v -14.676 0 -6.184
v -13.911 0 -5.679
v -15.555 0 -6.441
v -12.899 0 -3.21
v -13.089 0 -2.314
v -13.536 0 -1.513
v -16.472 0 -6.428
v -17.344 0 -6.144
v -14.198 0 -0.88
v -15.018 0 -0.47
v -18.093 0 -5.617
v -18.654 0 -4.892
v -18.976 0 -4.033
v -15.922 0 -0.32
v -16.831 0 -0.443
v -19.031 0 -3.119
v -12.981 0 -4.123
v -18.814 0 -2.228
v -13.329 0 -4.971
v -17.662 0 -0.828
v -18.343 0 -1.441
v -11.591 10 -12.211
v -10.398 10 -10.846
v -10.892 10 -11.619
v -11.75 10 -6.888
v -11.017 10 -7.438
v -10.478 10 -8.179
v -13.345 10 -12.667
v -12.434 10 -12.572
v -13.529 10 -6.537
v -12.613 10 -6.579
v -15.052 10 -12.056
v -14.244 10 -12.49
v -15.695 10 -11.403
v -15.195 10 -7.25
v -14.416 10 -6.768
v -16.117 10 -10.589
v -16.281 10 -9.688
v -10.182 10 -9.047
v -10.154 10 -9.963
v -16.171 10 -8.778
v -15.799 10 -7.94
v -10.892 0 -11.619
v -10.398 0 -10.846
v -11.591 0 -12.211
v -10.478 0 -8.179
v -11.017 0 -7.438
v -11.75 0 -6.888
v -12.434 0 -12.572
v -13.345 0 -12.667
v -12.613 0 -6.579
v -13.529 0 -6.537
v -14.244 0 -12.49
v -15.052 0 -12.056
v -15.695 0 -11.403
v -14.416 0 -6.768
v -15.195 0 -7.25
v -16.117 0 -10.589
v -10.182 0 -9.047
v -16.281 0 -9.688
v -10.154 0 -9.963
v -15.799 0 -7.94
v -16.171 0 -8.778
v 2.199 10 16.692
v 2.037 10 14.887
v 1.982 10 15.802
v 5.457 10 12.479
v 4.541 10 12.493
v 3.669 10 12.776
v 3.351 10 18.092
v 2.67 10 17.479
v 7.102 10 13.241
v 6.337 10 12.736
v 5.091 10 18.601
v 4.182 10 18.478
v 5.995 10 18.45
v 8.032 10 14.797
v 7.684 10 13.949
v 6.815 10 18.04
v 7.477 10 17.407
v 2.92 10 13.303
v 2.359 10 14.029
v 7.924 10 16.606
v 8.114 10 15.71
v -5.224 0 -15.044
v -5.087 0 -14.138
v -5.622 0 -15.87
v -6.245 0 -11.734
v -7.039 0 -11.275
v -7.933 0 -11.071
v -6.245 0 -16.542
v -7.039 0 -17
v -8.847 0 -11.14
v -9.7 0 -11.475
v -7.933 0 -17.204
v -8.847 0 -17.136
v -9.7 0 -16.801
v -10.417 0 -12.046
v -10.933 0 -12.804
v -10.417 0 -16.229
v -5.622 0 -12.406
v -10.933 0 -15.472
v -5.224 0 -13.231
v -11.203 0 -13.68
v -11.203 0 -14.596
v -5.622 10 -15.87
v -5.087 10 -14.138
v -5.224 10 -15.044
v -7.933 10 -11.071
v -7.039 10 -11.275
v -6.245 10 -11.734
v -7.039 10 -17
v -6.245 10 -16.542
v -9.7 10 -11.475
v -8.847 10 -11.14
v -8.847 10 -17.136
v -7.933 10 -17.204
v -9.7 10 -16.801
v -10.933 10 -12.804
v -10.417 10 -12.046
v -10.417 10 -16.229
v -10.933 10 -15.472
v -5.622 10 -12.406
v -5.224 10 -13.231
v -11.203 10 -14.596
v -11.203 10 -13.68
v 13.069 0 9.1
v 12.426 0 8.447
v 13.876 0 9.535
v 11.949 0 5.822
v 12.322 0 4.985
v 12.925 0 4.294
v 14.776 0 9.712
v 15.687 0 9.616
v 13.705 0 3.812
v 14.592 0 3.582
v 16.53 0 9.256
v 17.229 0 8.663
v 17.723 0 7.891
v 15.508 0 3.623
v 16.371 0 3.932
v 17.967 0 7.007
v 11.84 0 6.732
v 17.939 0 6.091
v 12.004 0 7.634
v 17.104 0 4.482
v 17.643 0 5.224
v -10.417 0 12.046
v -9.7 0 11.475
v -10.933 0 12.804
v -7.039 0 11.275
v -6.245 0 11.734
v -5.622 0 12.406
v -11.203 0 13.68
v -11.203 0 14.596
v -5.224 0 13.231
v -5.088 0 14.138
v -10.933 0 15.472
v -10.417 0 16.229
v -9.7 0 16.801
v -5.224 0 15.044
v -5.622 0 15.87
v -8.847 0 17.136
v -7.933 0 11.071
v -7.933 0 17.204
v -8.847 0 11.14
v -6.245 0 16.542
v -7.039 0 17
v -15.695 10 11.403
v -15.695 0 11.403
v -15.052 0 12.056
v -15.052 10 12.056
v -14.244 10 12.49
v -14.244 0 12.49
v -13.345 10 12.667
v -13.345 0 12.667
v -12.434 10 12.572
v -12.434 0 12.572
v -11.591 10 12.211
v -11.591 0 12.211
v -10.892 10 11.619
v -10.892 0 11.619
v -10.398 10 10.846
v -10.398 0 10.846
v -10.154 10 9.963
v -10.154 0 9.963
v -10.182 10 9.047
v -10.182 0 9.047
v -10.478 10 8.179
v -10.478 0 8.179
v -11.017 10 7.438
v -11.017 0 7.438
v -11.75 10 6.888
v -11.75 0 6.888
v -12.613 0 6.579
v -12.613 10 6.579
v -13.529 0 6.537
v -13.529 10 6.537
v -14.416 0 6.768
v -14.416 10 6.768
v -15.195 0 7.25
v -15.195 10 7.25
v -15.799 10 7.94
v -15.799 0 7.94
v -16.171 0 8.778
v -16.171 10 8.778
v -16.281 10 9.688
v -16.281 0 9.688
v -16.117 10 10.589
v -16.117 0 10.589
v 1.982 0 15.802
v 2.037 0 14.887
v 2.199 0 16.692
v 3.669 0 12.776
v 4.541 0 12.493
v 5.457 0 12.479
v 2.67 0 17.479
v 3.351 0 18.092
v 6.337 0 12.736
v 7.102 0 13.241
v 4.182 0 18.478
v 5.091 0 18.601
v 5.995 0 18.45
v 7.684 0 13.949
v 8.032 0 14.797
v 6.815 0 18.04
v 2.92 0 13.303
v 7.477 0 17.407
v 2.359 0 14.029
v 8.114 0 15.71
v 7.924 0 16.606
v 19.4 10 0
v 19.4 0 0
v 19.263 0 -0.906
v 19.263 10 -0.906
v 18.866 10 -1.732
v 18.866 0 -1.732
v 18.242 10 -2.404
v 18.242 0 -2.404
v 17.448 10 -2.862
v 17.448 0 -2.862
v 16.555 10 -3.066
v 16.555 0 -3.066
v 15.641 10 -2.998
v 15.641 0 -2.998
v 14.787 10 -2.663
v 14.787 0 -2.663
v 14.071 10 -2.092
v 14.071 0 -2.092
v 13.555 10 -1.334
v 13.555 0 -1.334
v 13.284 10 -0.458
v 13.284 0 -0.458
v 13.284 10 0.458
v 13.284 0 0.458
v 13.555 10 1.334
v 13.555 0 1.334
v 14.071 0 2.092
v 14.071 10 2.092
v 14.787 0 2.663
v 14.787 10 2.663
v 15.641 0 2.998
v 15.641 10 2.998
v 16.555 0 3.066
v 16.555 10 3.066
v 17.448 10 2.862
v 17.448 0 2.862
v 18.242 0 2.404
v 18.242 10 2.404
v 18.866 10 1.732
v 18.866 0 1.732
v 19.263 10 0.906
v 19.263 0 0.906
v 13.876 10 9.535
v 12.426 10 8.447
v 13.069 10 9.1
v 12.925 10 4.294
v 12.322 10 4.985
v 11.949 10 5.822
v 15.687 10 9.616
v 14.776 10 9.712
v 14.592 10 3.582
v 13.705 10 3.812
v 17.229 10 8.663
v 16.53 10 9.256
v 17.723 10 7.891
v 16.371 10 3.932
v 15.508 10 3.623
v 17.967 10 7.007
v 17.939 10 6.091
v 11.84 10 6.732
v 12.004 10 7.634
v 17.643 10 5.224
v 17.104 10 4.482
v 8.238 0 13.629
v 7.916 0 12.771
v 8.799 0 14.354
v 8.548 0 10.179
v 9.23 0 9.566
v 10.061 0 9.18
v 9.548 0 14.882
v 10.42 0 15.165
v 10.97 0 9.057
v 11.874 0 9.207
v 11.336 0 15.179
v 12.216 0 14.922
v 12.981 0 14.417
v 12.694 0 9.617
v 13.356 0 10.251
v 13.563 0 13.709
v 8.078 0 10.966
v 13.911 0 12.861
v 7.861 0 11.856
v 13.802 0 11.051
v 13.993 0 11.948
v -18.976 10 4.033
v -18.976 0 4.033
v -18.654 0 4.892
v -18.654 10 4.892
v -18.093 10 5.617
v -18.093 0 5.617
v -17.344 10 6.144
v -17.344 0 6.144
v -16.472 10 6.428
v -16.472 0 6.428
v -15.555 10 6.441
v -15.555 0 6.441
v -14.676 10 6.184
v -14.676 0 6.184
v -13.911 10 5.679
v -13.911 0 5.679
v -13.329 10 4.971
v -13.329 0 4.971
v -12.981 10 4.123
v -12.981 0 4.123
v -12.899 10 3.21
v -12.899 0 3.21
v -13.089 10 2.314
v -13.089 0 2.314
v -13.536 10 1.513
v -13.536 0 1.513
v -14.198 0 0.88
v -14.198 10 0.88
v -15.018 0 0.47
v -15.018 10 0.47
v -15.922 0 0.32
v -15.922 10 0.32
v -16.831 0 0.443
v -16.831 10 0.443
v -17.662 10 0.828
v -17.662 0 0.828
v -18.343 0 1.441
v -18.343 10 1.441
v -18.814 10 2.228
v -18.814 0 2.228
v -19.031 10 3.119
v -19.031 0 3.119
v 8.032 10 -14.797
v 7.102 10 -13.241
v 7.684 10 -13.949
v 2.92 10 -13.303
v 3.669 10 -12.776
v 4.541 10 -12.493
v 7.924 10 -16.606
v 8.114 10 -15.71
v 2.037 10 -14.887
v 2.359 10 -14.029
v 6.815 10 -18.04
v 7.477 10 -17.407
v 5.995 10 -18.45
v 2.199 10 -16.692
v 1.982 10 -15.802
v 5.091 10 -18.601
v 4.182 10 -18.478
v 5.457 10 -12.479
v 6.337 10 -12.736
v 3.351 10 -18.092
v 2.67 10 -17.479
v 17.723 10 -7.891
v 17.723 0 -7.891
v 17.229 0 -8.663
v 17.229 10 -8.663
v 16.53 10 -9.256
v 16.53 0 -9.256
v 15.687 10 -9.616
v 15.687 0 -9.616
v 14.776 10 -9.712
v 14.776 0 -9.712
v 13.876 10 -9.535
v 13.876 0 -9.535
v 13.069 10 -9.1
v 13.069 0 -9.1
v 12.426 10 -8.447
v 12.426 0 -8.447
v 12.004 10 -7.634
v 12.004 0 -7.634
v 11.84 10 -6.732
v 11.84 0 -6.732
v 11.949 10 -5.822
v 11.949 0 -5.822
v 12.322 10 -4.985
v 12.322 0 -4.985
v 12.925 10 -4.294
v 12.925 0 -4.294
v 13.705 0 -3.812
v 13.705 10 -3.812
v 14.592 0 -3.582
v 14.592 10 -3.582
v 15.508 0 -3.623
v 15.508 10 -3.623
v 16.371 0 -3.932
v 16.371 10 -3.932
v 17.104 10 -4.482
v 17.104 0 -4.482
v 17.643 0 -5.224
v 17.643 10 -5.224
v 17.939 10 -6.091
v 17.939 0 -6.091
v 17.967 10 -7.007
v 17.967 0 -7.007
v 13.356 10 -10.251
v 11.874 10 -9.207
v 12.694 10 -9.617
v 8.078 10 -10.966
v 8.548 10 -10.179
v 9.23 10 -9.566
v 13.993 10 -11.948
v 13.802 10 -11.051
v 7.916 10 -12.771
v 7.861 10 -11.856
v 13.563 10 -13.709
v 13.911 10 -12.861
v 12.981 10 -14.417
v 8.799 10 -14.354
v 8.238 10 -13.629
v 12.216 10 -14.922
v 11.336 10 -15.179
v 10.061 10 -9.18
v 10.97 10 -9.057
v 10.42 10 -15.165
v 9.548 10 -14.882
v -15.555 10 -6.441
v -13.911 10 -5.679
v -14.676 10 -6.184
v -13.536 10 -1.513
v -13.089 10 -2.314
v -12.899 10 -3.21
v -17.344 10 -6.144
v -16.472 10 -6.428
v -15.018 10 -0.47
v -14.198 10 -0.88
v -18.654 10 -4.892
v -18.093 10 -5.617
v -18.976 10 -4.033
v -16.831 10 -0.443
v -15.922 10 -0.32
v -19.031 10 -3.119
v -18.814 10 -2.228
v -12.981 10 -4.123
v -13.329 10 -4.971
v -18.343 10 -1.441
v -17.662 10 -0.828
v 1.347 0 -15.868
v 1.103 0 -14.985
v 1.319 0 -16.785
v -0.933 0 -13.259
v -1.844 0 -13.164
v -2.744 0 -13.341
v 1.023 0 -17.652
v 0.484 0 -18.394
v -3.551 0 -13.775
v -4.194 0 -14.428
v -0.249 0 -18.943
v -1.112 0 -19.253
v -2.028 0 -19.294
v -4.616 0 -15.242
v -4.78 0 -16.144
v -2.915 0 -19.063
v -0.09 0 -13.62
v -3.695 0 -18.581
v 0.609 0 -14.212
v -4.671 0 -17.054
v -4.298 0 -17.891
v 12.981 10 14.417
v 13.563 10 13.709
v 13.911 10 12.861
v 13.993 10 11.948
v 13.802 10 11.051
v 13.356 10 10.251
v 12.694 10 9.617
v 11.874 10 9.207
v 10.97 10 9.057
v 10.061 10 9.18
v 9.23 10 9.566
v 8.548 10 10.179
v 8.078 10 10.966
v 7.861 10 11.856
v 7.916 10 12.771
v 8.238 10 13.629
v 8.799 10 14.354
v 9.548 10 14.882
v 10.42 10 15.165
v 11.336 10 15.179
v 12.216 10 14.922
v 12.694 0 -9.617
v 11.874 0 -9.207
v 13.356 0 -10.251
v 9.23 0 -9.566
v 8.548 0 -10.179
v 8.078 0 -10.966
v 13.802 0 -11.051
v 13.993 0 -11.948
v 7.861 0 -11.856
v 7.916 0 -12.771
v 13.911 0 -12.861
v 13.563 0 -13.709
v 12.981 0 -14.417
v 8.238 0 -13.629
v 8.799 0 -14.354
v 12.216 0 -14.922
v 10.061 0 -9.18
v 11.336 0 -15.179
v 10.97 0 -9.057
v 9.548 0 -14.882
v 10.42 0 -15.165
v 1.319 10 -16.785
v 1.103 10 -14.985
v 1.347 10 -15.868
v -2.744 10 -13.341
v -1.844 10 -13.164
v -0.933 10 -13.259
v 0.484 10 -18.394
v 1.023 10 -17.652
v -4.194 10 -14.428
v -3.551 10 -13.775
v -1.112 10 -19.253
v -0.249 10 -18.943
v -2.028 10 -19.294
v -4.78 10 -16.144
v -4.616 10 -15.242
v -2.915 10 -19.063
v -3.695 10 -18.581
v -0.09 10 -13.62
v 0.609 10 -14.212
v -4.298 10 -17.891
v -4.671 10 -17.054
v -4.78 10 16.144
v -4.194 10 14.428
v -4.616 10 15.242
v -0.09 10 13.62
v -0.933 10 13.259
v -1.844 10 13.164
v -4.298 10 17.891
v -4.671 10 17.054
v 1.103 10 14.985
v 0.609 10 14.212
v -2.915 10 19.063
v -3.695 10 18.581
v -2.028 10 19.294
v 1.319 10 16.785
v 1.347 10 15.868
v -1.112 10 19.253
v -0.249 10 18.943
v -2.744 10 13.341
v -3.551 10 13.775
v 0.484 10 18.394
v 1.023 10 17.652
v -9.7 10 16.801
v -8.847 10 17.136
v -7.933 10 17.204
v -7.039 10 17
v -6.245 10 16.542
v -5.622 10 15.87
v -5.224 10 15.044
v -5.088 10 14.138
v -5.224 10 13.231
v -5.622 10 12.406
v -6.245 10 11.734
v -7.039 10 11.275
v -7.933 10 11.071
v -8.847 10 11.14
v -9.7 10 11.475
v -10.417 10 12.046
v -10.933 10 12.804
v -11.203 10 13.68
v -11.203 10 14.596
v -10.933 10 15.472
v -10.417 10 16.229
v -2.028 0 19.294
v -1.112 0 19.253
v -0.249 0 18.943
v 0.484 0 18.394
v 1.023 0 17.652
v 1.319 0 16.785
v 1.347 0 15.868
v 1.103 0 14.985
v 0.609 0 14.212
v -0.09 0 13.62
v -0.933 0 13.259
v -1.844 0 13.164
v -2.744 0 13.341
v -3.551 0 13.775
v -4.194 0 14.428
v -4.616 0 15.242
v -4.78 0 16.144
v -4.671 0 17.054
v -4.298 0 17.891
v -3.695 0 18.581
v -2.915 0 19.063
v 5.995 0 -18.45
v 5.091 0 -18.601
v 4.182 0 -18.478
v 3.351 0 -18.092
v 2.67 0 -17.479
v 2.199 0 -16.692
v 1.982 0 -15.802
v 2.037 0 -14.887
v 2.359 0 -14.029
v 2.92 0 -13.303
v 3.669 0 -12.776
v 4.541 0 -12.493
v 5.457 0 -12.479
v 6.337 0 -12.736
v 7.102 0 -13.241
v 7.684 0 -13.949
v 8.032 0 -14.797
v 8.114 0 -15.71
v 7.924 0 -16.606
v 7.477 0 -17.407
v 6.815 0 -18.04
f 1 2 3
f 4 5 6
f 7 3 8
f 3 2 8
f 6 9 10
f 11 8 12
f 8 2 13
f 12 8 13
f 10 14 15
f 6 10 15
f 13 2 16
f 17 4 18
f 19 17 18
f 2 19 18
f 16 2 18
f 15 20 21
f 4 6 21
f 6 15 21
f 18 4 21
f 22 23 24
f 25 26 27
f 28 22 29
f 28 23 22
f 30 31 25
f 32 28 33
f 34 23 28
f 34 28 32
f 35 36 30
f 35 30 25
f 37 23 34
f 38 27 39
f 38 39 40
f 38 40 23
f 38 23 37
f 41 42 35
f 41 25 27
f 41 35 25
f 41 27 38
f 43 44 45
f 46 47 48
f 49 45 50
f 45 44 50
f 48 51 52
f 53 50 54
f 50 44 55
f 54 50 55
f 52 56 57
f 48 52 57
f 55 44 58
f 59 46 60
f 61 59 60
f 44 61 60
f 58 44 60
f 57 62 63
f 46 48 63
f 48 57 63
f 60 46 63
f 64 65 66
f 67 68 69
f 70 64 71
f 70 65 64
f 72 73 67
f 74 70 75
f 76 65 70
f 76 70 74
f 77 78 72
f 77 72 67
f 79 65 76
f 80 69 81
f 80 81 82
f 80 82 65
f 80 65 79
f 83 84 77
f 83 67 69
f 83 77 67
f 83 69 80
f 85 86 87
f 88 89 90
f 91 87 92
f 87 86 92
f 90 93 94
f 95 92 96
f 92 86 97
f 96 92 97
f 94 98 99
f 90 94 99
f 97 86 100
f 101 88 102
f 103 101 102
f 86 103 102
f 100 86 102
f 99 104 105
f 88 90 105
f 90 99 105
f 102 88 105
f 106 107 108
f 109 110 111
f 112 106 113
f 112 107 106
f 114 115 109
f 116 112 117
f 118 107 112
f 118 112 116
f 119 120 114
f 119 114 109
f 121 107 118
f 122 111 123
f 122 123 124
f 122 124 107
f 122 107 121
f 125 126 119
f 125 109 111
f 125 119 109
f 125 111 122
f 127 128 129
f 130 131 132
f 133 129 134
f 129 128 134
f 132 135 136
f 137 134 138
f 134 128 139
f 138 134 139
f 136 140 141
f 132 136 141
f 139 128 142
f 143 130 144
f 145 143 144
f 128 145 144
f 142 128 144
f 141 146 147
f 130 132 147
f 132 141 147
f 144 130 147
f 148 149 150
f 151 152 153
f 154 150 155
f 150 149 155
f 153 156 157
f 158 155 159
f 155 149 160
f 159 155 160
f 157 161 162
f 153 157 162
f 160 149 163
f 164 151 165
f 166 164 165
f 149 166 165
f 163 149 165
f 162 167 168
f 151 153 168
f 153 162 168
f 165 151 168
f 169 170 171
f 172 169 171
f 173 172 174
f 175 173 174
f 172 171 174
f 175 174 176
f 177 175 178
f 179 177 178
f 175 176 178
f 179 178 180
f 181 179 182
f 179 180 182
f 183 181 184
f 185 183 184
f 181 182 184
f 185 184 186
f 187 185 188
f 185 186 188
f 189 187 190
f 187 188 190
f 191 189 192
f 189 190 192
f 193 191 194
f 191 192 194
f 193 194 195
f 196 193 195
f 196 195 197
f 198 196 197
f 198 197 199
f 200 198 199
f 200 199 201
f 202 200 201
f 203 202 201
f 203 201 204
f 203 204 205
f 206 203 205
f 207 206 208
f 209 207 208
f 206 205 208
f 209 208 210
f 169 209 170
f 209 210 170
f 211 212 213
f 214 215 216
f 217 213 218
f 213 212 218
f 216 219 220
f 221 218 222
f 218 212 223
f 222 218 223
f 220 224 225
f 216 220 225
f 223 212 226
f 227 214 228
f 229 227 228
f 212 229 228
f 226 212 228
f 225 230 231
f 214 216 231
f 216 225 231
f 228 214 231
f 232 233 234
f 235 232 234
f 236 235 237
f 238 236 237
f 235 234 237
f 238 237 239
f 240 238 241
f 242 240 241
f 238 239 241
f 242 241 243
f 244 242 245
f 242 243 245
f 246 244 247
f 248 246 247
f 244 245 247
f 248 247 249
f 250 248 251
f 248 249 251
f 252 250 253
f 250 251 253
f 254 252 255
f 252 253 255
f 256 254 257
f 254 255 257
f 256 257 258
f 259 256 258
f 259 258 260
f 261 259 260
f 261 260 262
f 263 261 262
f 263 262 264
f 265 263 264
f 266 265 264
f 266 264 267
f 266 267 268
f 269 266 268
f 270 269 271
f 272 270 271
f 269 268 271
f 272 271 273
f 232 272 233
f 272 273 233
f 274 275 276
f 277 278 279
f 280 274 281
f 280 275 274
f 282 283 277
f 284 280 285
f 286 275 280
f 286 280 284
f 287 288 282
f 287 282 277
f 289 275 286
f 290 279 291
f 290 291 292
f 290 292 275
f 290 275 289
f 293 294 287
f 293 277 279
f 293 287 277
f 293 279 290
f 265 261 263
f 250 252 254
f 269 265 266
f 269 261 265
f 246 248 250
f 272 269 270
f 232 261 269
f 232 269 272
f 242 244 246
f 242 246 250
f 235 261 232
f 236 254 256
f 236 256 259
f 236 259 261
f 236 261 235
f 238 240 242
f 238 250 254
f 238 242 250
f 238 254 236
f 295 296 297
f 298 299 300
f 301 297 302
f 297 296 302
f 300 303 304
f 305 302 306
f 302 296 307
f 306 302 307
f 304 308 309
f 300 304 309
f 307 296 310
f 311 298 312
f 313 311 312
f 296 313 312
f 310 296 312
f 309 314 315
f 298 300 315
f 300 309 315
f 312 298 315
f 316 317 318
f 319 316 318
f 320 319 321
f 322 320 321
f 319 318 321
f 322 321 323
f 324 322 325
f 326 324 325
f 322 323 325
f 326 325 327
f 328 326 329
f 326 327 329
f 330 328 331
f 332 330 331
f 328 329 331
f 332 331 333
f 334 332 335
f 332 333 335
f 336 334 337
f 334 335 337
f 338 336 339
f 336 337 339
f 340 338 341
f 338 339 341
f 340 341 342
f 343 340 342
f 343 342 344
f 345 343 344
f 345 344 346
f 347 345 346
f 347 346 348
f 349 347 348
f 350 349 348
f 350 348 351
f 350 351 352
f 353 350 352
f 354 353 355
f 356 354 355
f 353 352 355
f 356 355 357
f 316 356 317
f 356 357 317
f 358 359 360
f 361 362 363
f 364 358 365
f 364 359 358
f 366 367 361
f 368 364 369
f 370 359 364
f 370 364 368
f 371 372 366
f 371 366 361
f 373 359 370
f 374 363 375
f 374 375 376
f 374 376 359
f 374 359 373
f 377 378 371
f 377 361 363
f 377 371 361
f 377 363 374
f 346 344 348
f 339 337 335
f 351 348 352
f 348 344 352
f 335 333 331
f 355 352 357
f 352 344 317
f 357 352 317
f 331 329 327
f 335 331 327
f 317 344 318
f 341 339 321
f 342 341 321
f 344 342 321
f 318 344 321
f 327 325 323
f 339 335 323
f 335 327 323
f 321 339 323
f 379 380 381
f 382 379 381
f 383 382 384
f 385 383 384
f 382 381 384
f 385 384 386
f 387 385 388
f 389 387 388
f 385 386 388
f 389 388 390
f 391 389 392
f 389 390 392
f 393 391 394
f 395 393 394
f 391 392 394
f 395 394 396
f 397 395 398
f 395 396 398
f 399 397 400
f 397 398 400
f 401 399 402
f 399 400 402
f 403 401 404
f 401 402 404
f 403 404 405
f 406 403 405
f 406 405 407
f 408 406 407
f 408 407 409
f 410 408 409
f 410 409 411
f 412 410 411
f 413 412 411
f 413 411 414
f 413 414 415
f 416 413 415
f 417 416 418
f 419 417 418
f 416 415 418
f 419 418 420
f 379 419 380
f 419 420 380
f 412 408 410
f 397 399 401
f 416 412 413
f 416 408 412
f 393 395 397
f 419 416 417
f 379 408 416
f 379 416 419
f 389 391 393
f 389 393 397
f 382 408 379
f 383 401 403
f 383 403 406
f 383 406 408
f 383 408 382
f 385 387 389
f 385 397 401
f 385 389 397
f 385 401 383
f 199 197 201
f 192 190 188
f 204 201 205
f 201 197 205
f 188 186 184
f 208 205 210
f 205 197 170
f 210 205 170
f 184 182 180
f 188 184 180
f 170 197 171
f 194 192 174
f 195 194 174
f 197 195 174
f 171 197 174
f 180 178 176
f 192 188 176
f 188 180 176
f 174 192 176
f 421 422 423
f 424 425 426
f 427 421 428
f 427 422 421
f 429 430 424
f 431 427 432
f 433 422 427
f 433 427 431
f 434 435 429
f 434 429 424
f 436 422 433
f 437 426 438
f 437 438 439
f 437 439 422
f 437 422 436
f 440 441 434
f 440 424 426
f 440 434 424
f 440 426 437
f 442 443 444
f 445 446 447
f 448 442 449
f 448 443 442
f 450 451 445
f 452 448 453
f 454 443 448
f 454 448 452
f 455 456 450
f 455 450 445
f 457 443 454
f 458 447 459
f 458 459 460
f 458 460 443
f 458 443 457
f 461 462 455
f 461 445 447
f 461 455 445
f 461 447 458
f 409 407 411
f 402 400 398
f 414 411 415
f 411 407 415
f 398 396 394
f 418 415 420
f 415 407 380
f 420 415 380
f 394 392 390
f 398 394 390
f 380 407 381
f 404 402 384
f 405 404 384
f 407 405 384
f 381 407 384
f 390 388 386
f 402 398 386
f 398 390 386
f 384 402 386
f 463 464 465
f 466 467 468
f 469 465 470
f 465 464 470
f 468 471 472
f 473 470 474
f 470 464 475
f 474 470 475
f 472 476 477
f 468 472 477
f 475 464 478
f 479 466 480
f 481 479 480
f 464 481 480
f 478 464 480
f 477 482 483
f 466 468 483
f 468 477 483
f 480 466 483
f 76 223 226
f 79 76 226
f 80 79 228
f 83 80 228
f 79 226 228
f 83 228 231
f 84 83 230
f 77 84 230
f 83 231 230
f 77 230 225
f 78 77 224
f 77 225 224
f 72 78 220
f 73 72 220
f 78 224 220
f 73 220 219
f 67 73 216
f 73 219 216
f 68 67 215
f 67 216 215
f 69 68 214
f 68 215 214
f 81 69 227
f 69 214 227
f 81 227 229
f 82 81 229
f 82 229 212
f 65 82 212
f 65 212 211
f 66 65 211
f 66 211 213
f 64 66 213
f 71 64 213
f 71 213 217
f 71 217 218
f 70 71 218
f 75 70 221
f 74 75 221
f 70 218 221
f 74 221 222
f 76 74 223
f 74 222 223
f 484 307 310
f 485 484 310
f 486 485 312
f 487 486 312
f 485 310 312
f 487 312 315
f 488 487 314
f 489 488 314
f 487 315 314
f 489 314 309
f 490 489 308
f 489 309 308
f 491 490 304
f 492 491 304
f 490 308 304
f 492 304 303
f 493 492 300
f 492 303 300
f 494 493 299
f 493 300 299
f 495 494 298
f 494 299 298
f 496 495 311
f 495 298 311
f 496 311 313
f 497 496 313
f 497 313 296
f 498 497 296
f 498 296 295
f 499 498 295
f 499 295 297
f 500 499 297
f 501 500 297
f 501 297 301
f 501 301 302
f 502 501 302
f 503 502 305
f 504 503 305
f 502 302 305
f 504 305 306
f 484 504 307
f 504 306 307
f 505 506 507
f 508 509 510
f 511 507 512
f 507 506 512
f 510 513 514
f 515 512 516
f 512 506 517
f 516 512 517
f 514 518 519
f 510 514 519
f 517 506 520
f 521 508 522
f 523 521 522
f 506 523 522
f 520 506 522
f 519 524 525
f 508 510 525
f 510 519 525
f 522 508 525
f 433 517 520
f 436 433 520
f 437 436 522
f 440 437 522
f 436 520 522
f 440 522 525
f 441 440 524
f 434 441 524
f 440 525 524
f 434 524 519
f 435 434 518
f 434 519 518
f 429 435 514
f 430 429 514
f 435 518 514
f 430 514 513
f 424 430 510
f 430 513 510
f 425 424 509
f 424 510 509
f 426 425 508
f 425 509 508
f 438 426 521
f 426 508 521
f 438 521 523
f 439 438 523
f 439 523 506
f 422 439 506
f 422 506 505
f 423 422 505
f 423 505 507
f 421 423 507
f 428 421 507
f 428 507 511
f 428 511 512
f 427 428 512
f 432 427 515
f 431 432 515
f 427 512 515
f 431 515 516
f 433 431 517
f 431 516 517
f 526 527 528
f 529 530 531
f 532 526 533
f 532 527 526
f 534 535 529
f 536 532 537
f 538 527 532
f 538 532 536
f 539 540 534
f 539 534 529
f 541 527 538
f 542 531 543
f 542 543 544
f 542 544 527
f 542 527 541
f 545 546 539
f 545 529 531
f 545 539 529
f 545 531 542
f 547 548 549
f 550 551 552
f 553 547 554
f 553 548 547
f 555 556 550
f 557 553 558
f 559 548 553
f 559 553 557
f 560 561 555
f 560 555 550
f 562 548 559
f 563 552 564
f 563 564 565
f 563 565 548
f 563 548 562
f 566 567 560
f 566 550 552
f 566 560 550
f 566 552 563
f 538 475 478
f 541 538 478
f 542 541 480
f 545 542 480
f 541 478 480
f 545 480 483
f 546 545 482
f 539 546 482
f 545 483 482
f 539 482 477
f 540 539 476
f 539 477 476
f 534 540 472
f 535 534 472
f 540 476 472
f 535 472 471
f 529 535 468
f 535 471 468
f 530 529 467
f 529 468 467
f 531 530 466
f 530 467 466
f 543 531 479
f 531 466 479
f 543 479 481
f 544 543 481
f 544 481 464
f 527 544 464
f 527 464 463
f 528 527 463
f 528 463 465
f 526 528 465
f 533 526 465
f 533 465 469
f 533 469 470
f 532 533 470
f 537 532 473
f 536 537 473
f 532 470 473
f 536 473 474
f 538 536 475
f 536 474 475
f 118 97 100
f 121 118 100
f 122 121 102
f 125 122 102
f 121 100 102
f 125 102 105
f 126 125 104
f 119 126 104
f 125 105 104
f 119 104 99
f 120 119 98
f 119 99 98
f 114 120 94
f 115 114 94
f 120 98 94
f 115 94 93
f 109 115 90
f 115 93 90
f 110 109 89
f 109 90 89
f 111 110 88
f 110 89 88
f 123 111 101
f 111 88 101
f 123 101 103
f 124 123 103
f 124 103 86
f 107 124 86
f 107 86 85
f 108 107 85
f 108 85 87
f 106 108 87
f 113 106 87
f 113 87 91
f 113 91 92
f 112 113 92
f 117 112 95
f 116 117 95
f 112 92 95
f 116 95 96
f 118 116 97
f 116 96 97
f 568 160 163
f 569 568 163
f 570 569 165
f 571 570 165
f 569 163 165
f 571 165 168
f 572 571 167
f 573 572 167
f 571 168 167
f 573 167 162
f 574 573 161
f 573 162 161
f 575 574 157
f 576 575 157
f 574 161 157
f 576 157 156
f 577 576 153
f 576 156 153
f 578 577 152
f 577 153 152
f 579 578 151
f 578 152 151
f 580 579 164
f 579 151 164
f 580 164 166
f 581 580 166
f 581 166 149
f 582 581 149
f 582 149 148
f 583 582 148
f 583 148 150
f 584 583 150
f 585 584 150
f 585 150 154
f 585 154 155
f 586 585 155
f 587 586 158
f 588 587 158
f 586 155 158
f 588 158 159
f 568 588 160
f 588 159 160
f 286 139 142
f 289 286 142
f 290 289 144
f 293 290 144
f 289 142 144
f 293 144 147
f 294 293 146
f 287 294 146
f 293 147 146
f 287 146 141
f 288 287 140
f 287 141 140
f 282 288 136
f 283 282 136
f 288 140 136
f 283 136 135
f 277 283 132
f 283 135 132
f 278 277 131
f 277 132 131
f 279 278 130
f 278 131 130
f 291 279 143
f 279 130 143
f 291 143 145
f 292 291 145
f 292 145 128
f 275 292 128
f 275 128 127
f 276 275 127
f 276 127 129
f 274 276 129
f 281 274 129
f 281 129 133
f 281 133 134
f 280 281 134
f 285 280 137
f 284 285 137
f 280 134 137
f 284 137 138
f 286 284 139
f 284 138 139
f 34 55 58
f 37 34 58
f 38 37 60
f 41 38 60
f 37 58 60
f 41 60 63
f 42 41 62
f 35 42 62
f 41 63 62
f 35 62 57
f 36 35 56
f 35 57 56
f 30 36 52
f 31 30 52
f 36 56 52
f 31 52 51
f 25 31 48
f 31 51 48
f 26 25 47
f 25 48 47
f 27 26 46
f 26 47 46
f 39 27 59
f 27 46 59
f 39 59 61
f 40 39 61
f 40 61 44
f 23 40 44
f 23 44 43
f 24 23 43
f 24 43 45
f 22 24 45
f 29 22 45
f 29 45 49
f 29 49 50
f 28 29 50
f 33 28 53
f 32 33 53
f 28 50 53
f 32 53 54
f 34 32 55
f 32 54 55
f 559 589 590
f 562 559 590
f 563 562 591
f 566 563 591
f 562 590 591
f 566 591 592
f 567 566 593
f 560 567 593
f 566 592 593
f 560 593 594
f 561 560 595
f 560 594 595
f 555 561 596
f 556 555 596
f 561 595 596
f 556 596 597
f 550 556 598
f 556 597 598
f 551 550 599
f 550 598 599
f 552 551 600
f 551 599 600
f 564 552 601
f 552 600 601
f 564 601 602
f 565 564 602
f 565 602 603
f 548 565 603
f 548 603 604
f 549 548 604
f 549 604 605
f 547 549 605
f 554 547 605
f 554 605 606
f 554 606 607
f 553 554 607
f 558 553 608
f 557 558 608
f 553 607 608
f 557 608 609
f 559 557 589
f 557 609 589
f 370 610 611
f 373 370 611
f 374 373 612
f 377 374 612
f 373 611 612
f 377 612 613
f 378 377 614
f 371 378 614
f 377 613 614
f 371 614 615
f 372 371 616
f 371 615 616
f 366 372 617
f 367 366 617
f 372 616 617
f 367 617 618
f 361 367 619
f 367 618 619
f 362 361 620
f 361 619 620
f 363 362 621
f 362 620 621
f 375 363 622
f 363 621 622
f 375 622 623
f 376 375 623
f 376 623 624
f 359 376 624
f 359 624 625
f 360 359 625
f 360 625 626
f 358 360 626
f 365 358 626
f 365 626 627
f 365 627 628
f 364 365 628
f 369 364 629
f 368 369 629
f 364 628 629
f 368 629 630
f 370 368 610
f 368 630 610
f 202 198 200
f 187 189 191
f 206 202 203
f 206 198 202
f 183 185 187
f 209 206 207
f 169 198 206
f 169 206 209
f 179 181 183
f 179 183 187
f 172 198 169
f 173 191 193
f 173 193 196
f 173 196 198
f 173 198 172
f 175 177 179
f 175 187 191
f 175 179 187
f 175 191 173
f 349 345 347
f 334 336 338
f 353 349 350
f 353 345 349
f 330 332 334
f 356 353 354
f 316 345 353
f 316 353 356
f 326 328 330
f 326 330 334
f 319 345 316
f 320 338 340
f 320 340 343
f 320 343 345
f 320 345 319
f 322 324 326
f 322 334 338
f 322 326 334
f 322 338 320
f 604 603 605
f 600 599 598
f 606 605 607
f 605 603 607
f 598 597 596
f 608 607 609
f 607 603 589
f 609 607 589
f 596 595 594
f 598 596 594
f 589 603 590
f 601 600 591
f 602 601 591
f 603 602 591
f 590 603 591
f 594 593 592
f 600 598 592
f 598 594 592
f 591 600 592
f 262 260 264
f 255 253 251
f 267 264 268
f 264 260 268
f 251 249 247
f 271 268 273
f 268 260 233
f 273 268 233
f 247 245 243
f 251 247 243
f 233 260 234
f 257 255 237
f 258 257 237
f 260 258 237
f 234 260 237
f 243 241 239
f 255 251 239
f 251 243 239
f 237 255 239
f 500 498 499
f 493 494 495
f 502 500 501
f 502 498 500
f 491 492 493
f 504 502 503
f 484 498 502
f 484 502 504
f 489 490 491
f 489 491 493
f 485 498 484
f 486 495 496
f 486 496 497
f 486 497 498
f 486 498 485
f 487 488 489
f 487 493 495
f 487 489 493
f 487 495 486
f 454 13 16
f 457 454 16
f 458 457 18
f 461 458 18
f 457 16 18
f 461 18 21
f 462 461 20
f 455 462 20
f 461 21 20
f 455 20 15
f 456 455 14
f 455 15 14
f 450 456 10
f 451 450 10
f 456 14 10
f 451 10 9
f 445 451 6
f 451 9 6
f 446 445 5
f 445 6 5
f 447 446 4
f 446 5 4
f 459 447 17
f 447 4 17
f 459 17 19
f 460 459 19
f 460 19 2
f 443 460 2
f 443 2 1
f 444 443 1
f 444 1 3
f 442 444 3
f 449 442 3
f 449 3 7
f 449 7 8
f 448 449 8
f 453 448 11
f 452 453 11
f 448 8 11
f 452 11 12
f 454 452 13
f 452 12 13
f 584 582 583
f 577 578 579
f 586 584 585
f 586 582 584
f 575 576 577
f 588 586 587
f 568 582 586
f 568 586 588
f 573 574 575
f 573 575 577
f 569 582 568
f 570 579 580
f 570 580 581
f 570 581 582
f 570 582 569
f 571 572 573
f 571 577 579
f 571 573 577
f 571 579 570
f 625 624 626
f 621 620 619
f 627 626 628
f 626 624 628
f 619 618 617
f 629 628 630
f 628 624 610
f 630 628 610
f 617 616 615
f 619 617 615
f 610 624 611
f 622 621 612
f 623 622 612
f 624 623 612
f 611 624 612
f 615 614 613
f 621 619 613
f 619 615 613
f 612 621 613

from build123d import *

# Parameters (mm, degrees)
SKETCH1_R           = 3.075
BOSS_EXTRUDE1_DEPTH = 10
CIRPATTERN1_COUNT   = 15


with BuildPart() as part:
    # Sketch1 → Boss-Extrude1 (new body)
    with BuildSketch(Plane(origin=(0, 0, 0), x_dir=(1, 0, 0), z_dir=(0, 1, 0))):
        with Locations((16.325, 0)):
            Circle(SKETCH1_R)
    extrude(amount=BOSS_EXTRUDE1_DEPTH)


with BuildPart() as cirpattern1_1:
    # CirPattern1: pattern copy
    add(part.part.rotate(Axis((0, 0, 0), (0, 1, 0)), 1 * 360 / CIRPATTERN1_COUNT))


with BuildPart() as cirpattern1_2:
    # CirPattern1: pattern copy
    add(part.part.rotate(Axis((0, 0, 0), (0, 1, 0)), 2 * 360 / CIRPATTERN1_COUNT))


with BuildPart() as cirpattern1_3:
    # CirPattern1: pattern copy
    add(part.part.rotate(Axis((0, 0, 0), (0, 1, 0)), 3 * 360 / CIRPATTERN1_COUNT))


with BuildPart() as cirpattern1_4:
    # CirPattern1: pattern copy
    add(part.part.rotate(Axis((0, 0, 0), (0, 1, 0)), 4 * 360 / CIRPATTERN1_COUNT))


with BuildPart() as cirpattern1_5:
    # CirPattern1: pattern copy
    add(part.part.rotate(Axis((0, 0, 0), (0, 1, 0)), 5 * 360 / CIRPATTERN1_COUNT))


with BuildPart() as cirpattern1_6:
    # CirPattern1: pattern copy
    add(part.part.rotate(Axis((0, 0, 0), (0, 1, 0)), 6 * 360 / CIRPATTERN1_COUNT))


with BuildPart() as cirpattern1_7:
    # CirPattern1: pattern copy
    add(part.part.rotate(Axis((0, 0, 0), (0, 1, 0)), 7 * 360 / CIRPATTERN1_COUNT))


with BuildPart() as cirpattern1_8:
    # CirPattern1: pattern copy
    add(part.part.rotate(Axis((0, 0, 0), (0, 1, 0)), 8 * 360 / CIRPATTERN1_COUNT))


with BuildPart() as cirpattern1_9:
    # CirPattern1: pattern copy
    add(part.part.rotate(Axis((0, 0, 0), (0, 1, 0)), 9 * 360 / CIRPATTERN1_COUNT))


with BuildPart() as cirpattern1_10:
    # CirPattern1: pattern copy
    add(part.part.rotate(Axis((0, 0, 0), (0, 1, 0)), 10 * 360 / CIRPATTERN1_COUNT))


with BuildPart() as cirpattern1_11:
    # CirPattern1: pattern copy
    add(part.part.rotate(Axis((0, 0, 0), (0, 1, 0)), 11 * 360 / CIRPATTERN1_COUNT))


with BuildPart() as cirpattern1_12:
    # CirPattern1: pattern copy
    add(part.part.rotate(Axis((0, 0, 0), (0, 1, 0)), 12 * 360 / CIRPATTERN1_COUNT))


with BuildPart() as cirpattern1_13:
    # CirPattern1: pattern copy
    add(part.part.rotate(Axis((0, 0, 0), (0, 1, 0)), 13 * 360 / CIRPATTERN1_COUNT))


with BuildPart() as cirpattern1_14:
    # CirPattern1: pattern copy
    add(part.part.rotate(Axis((0, 0, 0), (0, 1, 0)), 14 * 360 / CIRPATTERN1_COUNT))


solid = Compound([part.part, cirpattern1_1.part, cirpattern1_2.part, cirpattern1_3.part, cirpattern1_4.part, cirpattern1_5.part, cirpattern1_6.part, cirpattern1_7.part, cirpattern1_8.part, cirpattern1_9.part, cirpattern1_10.part, cirpattern1_11.part, cirpattern1_12.part, cirpattern1_13.part, cirpattern1_14.part])
